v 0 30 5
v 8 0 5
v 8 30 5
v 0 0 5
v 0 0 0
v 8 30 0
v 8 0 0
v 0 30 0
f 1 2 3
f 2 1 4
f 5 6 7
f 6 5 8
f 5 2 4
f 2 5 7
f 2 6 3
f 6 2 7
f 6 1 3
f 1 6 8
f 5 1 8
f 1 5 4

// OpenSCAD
module slab(w = 10, l = 20, t = 3) {
  cube([w, l, t]);
}
slab(t = 5, w = 8, l = 30);
